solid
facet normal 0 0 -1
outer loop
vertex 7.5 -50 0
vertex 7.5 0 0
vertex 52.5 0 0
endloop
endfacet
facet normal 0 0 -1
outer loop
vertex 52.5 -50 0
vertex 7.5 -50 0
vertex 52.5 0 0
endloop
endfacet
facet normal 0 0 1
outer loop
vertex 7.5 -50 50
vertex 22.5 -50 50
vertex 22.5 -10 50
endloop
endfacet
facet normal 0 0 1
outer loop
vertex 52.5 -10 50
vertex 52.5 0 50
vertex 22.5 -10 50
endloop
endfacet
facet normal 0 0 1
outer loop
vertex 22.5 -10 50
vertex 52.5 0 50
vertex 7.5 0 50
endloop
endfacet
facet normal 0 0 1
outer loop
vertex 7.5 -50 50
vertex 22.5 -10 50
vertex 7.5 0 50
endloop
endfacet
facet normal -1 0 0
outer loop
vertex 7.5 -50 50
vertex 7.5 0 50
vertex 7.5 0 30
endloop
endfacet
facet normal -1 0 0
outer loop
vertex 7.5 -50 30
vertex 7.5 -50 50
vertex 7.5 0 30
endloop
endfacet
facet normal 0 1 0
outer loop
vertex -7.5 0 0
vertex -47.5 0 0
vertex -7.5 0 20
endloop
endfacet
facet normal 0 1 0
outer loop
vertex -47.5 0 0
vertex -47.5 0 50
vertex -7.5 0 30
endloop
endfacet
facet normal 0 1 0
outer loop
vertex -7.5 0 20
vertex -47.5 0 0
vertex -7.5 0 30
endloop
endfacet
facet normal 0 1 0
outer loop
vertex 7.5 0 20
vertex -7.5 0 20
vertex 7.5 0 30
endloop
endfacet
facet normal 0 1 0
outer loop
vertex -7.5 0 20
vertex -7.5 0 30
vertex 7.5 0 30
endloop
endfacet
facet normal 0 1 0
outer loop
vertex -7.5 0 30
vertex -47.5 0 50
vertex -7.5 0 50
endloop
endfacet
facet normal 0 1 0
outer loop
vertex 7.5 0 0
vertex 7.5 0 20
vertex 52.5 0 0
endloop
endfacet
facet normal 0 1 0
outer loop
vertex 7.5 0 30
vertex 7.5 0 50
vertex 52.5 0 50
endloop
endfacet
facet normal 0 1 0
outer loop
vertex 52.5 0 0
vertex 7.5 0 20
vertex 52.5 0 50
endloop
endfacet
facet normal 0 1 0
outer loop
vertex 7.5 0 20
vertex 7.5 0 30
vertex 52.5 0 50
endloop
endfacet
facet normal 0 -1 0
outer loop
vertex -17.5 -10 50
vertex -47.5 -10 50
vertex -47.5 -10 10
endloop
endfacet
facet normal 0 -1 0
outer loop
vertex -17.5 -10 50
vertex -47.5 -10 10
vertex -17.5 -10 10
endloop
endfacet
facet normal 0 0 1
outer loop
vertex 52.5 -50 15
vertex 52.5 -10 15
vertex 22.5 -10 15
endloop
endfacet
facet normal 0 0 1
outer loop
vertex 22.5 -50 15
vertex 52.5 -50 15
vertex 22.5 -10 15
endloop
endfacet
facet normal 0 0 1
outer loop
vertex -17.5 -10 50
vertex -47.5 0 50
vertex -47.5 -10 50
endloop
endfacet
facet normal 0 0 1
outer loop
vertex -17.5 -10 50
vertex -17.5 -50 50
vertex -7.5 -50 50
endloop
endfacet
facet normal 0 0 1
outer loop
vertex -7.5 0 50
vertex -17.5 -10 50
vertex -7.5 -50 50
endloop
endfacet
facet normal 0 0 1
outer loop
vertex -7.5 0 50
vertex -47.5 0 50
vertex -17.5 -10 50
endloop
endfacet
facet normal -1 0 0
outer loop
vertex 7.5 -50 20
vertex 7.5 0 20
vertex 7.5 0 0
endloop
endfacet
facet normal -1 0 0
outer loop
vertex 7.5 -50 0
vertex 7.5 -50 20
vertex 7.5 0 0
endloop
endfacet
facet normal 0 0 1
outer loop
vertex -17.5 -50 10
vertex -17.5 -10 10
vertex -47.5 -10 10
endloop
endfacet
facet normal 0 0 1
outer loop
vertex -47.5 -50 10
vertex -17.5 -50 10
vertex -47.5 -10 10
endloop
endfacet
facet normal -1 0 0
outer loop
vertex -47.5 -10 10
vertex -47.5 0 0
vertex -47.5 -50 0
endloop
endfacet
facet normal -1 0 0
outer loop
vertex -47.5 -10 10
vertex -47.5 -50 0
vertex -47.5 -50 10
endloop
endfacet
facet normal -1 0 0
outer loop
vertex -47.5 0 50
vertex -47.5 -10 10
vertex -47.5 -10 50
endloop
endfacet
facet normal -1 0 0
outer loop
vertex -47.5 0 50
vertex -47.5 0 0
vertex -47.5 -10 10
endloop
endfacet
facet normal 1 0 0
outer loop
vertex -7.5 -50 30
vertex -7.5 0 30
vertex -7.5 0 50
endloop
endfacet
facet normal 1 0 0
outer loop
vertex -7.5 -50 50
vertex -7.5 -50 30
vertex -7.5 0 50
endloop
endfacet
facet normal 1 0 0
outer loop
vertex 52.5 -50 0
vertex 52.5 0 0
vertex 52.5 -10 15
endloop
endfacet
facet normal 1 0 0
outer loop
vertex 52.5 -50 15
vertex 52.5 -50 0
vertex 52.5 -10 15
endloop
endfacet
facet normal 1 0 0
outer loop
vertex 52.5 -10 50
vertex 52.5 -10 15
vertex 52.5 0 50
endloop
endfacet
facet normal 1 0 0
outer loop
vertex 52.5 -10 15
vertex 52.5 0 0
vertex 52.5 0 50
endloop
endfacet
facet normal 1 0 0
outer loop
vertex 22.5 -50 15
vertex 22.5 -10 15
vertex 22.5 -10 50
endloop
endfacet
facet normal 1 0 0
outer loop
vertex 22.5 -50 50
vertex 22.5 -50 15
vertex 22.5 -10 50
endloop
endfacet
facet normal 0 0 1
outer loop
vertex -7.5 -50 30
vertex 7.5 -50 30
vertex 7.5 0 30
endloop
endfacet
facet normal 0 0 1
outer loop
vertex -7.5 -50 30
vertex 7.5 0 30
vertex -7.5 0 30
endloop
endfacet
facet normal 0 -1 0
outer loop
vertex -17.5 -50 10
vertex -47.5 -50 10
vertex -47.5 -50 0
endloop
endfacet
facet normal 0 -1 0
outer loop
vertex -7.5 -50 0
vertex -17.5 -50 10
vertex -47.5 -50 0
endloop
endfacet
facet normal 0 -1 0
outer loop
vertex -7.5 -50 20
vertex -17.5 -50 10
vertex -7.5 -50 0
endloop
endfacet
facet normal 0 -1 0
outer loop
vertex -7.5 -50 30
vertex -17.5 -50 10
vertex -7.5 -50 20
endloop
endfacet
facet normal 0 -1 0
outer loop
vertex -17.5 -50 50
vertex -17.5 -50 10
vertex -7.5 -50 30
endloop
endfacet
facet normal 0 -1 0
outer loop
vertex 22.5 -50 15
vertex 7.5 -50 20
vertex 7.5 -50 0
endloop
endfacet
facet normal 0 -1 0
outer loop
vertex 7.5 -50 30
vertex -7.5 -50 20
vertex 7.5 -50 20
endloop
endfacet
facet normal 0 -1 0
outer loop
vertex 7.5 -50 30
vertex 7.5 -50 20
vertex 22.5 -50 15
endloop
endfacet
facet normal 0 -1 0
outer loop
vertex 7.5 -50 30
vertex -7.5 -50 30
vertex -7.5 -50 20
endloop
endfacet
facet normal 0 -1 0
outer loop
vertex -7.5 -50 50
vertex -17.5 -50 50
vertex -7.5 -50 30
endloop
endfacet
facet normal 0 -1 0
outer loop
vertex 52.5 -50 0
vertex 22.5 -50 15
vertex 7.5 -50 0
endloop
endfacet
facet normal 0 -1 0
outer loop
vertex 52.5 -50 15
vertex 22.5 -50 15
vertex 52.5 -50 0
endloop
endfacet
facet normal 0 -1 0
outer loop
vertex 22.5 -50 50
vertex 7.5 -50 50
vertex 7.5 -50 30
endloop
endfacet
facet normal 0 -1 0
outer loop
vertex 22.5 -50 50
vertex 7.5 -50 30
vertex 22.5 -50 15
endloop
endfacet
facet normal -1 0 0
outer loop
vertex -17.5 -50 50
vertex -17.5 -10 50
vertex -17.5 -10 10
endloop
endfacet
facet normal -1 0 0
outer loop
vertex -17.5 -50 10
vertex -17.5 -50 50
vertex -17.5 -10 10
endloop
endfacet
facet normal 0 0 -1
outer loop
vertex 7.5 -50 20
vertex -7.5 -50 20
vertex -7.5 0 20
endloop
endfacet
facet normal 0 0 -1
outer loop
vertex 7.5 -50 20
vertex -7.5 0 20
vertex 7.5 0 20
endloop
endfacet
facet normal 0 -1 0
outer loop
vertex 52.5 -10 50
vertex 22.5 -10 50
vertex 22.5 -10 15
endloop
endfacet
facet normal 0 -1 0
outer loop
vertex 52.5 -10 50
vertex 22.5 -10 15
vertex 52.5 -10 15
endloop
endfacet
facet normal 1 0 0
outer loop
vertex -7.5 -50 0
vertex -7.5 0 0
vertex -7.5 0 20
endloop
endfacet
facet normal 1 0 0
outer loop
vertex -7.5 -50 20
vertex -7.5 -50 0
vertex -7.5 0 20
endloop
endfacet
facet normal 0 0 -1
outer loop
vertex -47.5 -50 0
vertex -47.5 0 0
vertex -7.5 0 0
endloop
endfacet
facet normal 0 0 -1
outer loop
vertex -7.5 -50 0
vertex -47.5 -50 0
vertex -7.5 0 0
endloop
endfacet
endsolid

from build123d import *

# Parameters (mm, degrees)
F1_DEPTH = 50
F2_W     = 30
F2_H     = 40
F2_H_2   = 35
F3_DEPTH = 10


with BuildPart() as f1:
    # F0 (on Front) → F1 (new body)
    with BuildSketch(Plane.XZ):
        Polygon((-17.5, 50), (-17.5, 10), (-47.5, 10), (-47.5, 0), (-7.5, 0), (-7.5, 20), (7.5, 20), (7.5, 0), (52.5, 0), (52.5, 15), (22.5, 15), (22.5, 50), (7.5, 50), (7.5, 30), (-7.5, 30), (-7.5, 50), align=None)
    extrude(amount=F1_DEPTH)

    # F2 (on Front) → F3 (join)
    with BuildSketch(Plane.XZ):
        with Locations((-32.5, 30)):
            Rectangle(F2_W, F2_H)
        with Locations((37.5, 32.5)):
            Rectangle(F2_W, F2_H_2)
    extrude(amount=F3_DEPTH)


solid = f1.part
